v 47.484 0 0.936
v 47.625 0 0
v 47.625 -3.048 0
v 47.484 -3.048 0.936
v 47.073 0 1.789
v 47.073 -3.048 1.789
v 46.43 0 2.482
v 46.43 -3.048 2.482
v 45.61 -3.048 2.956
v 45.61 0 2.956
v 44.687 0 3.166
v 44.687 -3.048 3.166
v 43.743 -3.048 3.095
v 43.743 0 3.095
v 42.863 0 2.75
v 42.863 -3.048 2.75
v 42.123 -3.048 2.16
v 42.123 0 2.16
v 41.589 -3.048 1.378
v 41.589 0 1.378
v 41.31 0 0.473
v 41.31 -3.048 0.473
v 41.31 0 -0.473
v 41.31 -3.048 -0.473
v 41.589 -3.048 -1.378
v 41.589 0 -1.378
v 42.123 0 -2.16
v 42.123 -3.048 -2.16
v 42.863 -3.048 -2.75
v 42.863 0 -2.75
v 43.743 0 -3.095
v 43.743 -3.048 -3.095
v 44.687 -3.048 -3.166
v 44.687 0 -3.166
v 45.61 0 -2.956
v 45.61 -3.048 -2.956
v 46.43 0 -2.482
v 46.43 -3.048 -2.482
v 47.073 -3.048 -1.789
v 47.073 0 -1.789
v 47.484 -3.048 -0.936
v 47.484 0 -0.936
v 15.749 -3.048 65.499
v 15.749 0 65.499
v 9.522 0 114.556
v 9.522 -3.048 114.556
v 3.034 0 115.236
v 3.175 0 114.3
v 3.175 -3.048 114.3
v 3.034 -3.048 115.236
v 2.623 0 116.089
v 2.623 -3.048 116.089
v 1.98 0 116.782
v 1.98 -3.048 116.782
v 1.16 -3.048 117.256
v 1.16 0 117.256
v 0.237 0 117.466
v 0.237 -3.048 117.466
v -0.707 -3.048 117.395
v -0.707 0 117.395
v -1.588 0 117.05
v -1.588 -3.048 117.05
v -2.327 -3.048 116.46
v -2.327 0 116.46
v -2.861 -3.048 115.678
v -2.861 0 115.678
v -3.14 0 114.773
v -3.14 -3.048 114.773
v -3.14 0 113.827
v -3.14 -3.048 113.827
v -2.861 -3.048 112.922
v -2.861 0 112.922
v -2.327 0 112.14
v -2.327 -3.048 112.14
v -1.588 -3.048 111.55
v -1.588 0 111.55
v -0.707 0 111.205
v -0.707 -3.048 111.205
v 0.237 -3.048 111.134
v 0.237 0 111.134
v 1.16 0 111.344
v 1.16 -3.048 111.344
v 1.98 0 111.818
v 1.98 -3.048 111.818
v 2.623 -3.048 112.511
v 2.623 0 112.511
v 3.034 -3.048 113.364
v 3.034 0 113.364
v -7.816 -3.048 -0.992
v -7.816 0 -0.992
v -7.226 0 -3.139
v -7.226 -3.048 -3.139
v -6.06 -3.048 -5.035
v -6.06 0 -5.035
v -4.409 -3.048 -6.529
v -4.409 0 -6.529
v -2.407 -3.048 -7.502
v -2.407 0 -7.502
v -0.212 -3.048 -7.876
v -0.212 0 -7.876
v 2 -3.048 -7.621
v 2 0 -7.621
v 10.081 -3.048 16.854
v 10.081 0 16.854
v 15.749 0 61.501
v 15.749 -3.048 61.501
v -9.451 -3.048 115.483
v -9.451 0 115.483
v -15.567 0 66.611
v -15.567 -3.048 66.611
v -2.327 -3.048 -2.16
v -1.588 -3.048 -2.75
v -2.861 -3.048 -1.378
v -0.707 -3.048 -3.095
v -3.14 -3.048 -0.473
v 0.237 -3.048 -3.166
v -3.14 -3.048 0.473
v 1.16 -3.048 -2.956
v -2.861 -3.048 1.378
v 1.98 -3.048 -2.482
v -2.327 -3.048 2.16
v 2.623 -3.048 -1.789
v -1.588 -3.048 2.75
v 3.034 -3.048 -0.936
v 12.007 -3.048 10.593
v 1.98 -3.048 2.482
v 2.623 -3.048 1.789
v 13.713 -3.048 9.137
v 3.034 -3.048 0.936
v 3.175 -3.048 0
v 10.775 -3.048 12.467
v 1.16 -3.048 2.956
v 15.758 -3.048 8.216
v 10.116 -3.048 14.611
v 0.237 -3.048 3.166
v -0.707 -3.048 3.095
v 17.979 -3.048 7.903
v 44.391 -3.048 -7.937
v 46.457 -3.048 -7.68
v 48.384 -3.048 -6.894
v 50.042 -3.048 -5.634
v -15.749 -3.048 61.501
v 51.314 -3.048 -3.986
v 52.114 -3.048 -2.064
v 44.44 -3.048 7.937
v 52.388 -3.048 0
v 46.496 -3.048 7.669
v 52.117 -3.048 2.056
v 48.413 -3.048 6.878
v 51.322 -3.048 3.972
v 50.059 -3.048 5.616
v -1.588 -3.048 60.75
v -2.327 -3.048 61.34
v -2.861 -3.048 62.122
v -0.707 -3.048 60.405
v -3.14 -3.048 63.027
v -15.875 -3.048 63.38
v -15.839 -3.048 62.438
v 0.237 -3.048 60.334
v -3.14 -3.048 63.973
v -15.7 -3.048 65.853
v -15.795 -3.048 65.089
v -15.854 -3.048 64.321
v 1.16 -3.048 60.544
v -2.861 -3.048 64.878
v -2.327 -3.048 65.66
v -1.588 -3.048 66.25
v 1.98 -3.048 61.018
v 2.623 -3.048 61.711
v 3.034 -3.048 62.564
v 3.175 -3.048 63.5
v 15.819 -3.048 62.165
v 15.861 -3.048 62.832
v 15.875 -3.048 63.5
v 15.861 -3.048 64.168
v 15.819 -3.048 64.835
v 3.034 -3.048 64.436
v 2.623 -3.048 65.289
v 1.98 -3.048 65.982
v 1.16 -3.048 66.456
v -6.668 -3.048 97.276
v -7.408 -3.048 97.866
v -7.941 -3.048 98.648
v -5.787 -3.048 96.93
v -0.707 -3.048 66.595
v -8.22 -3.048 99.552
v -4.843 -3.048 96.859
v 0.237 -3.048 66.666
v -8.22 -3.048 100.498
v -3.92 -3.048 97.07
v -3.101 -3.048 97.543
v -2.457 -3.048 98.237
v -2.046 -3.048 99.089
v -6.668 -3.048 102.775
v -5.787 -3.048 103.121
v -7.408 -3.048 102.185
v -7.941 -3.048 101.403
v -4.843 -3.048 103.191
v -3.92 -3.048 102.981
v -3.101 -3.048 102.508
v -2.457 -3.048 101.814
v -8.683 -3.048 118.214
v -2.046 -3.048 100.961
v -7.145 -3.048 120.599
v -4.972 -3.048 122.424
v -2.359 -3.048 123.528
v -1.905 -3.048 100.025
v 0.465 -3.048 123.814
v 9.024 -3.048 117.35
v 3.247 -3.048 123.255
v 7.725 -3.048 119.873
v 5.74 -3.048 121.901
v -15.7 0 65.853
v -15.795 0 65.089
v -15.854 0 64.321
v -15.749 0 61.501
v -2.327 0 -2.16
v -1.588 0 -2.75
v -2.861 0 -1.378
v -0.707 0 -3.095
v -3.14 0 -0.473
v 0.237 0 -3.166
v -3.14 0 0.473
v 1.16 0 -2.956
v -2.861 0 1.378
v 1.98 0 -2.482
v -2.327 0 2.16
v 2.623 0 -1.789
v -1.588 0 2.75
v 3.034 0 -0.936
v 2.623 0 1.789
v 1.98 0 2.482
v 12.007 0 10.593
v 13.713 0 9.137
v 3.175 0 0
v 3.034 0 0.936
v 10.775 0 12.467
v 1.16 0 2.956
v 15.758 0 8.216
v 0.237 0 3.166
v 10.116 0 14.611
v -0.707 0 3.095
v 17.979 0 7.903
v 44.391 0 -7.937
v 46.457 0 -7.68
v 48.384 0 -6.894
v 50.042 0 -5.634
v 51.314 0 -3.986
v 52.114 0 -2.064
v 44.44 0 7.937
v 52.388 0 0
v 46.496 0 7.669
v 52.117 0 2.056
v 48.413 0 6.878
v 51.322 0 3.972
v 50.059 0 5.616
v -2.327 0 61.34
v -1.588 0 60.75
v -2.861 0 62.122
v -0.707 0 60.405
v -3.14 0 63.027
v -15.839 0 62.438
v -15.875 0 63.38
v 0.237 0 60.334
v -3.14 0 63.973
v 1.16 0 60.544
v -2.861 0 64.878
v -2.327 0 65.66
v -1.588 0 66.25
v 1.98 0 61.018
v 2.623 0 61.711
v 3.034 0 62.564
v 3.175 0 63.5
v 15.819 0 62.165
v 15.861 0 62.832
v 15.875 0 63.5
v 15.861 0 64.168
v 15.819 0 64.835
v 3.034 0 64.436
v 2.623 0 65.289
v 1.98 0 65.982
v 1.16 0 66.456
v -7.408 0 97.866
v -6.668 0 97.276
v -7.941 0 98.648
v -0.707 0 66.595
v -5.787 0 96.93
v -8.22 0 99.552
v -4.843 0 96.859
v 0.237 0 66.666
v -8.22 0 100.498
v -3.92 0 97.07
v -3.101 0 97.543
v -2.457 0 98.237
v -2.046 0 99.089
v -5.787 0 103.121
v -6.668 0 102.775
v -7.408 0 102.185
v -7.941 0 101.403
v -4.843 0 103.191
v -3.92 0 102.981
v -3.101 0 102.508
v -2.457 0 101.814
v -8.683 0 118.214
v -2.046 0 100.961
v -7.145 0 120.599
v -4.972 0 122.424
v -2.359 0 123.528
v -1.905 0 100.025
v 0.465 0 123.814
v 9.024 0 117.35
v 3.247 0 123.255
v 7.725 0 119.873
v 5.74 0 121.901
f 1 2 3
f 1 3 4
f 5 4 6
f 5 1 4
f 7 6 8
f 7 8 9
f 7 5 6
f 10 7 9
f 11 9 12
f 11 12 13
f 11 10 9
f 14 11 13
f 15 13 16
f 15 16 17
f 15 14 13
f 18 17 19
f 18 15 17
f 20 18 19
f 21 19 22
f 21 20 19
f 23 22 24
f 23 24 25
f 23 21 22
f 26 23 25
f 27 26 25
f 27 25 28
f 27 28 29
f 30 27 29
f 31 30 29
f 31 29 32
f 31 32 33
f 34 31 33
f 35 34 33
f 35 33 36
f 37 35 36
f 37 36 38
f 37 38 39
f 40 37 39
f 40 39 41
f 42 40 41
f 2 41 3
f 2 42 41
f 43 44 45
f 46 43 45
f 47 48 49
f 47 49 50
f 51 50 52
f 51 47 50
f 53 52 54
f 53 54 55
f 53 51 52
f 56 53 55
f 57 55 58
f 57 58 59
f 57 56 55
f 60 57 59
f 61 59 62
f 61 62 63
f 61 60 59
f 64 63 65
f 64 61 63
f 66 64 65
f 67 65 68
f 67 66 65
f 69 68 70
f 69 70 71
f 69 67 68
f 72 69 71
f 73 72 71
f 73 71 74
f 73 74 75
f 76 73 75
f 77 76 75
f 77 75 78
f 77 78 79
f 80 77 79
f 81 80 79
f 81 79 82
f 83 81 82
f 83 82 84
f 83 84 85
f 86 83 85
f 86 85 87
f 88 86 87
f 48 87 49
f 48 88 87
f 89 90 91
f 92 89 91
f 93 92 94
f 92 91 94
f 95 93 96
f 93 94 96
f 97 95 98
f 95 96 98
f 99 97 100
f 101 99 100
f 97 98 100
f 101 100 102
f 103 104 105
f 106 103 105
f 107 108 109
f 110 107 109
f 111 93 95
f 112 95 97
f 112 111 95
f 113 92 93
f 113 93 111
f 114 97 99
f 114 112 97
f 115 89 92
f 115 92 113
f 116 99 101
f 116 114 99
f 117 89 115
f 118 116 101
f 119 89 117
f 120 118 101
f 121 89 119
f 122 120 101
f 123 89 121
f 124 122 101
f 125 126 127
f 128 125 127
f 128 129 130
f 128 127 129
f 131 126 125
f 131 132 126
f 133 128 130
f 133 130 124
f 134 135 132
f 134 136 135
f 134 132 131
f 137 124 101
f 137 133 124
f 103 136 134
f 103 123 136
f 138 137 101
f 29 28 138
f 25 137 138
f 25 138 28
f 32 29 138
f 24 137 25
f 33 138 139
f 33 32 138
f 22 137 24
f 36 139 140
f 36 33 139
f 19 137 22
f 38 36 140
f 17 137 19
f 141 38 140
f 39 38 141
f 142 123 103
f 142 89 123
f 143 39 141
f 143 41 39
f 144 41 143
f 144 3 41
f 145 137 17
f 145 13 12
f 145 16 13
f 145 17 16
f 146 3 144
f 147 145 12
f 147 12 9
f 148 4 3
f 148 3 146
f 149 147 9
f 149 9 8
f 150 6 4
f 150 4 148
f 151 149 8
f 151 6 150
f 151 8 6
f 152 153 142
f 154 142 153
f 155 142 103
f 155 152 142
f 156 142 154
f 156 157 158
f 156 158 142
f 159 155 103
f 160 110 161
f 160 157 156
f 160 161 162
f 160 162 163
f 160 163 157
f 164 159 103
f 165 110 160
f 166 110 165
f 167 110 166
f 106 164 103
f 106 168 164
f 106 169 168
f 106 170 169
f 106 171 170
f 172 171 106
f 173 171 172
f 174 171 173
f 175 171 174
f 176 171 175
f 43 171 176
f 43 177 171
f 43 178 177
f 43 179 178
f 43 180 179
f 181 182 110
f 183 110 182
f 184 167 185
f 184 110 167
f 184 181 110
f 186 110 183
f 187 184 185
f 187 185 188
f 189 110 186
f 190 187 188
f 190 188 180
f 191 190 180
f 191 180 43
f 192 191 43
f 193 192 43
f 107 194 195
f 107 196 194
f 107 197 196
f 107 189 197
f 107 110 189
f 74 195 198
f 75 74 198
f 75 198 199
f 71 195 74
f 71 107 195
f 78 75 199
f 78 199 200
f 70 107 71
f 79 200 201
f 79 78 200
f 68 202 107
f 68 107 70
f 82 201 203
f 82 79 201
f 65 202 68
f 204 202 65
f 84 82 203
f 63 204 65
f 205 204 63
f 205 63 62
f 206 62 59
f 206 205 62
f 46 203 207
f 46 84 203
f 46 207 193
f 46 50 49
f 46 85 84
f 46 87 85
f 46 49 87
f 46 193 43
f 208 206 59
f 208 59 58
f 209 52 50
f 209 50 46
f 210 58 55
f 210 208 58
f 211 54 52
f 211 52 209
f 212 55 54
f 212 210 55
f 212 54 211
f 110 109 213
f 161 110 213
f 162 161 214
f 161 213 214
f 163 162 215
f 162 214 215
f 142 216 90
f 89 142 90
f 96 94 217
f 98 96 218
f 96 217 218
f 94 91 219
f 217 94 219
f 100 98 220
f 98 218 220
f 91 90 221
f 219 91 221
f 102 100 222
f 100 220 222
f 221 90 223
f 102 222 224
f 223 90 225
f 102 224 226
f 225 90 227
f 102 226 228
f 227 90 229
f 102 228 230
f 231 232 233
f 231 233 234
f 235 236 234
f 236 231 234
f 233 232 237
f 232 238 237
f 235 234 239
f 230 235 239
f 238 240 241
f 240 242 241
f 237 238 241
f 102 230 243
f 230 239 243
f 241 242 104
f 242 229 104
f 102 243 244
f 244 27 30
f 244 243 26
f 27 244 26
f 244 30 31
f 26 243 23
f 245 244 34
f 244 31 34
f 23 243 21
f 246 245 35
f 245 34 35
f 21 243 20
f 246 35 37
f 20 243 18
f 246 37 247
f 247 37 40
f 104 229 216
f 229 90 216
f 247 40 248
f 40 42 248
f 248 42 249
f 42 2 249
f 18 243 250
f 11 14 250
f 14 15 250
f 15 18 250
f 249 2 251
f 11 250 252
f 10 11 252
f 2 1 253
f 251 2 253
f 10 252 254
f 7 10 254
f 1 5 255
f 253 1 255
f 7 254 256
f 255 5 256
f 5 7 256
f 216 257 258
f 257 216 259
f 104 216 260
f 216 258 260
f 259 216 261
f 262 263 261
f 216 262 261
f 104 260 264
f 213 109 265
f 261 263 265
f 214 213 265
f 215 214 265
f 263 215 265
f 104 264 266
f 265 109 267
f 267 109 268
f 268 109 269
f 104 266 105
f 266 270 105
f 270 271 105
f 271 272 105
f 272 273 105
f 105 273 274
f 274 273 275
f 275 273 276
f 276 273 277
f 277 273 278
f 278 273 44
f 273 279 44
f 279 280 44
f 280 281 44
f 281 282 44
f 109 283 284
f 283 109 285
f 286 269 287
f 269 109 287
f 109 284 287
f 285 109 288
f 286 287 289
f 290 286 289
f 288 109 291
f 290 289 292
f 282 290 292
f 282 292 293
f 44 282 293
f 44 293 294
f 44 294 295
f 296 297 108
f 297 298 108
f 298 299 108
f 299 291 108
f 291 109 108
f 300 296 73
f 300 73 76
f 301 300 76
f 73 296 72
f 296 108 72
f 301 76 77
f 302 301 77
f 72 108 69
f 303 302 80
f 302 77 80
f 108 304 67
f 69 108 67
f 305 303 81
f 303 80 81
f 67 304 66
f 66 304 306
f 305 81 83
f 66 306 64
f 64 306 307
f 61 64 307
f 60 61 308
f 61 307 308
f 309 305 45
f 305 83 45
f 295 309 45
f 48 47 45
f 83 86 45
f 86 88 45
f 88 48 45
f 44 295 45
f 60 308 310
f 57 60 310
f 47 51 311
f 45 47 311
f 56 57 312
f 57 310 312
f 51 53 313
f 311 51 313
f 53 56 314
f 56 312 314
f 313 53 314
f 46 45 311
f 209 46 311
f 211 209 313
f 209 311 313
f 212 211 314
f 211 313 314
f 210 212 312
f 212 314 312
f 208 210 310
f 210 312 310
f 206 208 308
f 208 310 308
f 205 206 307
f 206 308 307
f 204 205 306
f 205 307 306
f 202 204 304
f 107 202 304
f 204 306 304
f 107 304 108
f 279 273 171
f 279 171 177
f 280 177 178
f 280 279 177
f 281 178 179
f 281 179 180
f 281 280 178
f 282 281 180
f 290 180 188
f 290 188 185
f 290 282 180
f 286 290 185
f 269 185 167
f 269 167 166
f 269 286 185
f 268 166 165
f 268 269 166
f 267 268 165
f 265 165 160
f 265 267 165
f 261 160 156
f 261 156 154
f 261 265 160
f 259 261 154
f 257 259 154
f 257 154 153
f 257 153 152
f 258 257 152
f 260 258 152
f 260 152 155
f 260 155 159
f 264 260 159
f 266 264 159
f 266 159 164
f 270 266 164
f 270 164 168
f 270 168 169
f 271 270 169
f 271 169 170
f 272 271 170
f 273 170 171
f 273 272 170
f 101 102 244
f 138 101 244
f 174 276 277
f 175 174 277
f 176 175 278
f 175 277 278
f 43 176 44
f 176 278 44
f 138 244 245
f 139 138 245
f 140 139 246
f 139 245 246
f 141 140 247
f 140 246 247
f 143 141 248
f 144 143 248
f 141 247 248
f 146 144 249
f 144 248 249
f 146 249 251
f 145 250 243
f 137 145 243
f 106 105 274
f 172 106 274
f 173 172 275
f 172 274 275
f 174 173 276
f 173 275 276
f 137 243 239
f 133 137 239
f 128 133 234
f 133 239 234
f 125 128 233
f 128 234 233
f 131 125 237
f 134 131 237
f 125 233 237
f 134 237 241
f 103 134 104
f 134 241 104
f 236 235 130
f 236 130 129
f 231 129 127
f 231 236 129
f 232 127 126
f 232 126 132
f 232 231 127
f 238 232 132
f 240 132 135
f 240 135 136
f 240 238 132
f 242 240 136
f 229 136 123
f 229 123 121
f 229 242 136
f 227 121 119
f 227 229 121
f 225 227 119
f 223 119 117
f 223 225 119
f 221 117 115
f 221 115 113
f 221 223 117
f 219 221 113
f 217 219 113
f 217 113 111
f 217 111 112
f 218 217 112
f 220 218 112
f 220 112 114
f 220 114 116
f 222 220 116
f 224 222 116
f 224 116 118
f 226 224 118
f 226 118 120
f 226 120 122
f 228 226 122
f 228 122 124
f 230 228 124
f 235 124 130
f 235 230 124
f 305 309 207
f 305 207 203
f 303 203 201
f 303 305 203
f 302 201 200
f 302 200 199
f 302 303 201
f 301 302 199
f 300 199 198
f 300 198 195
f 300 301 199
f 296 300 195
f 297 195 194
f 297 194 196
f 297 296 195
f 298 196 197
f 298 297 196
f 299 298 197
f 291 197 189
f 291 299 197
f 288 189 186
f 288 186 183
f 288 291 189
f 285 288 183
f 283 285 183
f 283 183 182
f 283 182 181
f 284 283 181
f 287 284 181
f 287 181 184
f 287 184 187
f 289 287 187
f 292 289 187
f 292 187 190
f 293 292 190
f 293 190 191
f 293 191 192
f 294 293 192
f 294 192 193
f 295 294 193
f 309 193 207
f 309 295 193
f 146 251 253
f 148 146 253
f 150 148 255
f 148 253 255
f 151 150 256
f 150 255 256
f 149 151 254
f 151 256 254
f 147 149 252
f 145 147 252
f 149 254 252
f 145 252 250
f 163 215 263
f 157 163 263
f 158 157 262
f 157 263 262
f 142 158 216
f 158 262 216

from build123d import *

# Parameters (mm, degrees)
F0_R     = 3.175
F1_DEPTH = 3.048


with BuildPart() as f1:
    # F0 (on Front) → F1 (new body)
    with BuildSketch(Plane.XZ):
        with BuildLine():
            ThreePointArc((15.748631, 61.500946), (15.843376, 62.498478), (15.874999, 63.5))
            ThreePointArc((15.874999, 63.5), (15.843376, 64.501522), (15.748631, 65.499054))
            ThreePointArc((15.748631, 65.499054), (0.563144, 79.365008), (-15.567259, 66.610643))
            Line((-15.567259, 66.610643), (-15.853733, 64.321458))
            ThreePointArc((-15.853733, 64.321458), (-15.863991, 62.908862), (-15.748633, 61.500946))
            ThreePointArc((-15.748633, 61.500946), (0, 47.625), (15.748631, 61.500946))
        make_face()
        with Locations((-1e-06, 63.5)):
            Circle(F0_R, mode=Mode.SUBTRACT)
        with BuildLine():
            ThreePointArc((-15.567259, 66.610643), (0.563144, 79.365008), (15.748631, 65.499054))
            Line((15.748631, 65.499054), (9.521553, 114.556243))
            ThreePointArc((9.521553, 114.556243), (9.524138, 114.428133), (9.525, 114.3))
            ThreePointArc((9.525, 114.3), (-0.592526, 104.793448), (-9.451281, 115.482757))
            Line((-9.451281, 115.482757), (-15.567259, 66.610643))
        make_face()
        with Locations((-5.080221, 100.0252)):
            Circle(F0_R, mode=Mode.SUBTRACT)
        with BuildLine():
            Line((10.08135, 16.853859), (15.748631, 61.500946))
            ThreePointArc((15.748631, 61.500946), (0, 47.625), (-15.748633, 61.500946))
            Line((-15.748633, 61.500946), (-7.816068, -0.992133))
            ThreePointArc((-7.816068, -0.992133), (-0.497057, 7.86309), (7.878784, 0))
            ThreePointArc((7.878784, 0), (6.238207, -4.812486), (1.9997, -7.62079))
            Line((1.9997, -7.62079), (44.390741, -7.937279))
            ThreePointArc((44.390741, -7.937279), (36.512537, 0.024387), (44.439515, 7.937493))
            Line((44.439515, 7.937493), (17.978767, 7.90254))
            ThreePointArc((17.978767, 7.90254), (12.006638, 10.593011), (10.08135, 16.853859))
        make_face()
        with BuildLine():
            Line((-15.853733, 64.321458), (-15.567259, 66.610643))
            ThreePointArc((-15.567259, 66.610643), (-15.752135, 65.471261), (-15.853733, 64.321458))
        make_face()
        with BuildLine():
            ThreePointArc((9.525, 114.3), (9.524138, 114.428133), (9.521553, 114.556243))
            ThreePointArc((9.521553, 114.556243), (0.464587, 123.813663), (-9.451281, 115.482757))
            ThreePointArc((-9.451281, 115.482757), (-0.592526, 104.793448), (9.525, 114.3))
        make_face()
        with Locations((0, 114.3)):
            Circle(F0_R, mode=Mode.SUBTRACT)
        with BuildLine():
            ThreePointArc((7.878784, 0), (-0.497057, 7.86309), (-7.816068, -0.992133))
            ThreePointArc((-7.816068, -0.992133), (-4.409343, -6.52939), (1.9997, -7.62079))
            ThreePointArc((1.9997, -7.62079), (6.238207, -4.812486), (7.878784, 0))
        make_face()
        Circle(F0_R, mode=Mode.SUBTRACT)
        with BuildLine():
            ThreePointArc((52.3875, 0), (50.058952, 5.616366), (44.439515, 7.937493))
            ThreePointArc((44.439515, 7.937493), (36.512537, 0.024387), (44.390741, -7.937279))
            ThreePointArc((44.390741, -7.937279), (50.04167, -5.633572), (52.3875, 0))
        make_face()
        with Locations((44.45, 0)):
            Circle(F0_R, mode=Mode.SUBTRACT)
    extrude(amount=F1_DEPTH)


solid = f1.part
